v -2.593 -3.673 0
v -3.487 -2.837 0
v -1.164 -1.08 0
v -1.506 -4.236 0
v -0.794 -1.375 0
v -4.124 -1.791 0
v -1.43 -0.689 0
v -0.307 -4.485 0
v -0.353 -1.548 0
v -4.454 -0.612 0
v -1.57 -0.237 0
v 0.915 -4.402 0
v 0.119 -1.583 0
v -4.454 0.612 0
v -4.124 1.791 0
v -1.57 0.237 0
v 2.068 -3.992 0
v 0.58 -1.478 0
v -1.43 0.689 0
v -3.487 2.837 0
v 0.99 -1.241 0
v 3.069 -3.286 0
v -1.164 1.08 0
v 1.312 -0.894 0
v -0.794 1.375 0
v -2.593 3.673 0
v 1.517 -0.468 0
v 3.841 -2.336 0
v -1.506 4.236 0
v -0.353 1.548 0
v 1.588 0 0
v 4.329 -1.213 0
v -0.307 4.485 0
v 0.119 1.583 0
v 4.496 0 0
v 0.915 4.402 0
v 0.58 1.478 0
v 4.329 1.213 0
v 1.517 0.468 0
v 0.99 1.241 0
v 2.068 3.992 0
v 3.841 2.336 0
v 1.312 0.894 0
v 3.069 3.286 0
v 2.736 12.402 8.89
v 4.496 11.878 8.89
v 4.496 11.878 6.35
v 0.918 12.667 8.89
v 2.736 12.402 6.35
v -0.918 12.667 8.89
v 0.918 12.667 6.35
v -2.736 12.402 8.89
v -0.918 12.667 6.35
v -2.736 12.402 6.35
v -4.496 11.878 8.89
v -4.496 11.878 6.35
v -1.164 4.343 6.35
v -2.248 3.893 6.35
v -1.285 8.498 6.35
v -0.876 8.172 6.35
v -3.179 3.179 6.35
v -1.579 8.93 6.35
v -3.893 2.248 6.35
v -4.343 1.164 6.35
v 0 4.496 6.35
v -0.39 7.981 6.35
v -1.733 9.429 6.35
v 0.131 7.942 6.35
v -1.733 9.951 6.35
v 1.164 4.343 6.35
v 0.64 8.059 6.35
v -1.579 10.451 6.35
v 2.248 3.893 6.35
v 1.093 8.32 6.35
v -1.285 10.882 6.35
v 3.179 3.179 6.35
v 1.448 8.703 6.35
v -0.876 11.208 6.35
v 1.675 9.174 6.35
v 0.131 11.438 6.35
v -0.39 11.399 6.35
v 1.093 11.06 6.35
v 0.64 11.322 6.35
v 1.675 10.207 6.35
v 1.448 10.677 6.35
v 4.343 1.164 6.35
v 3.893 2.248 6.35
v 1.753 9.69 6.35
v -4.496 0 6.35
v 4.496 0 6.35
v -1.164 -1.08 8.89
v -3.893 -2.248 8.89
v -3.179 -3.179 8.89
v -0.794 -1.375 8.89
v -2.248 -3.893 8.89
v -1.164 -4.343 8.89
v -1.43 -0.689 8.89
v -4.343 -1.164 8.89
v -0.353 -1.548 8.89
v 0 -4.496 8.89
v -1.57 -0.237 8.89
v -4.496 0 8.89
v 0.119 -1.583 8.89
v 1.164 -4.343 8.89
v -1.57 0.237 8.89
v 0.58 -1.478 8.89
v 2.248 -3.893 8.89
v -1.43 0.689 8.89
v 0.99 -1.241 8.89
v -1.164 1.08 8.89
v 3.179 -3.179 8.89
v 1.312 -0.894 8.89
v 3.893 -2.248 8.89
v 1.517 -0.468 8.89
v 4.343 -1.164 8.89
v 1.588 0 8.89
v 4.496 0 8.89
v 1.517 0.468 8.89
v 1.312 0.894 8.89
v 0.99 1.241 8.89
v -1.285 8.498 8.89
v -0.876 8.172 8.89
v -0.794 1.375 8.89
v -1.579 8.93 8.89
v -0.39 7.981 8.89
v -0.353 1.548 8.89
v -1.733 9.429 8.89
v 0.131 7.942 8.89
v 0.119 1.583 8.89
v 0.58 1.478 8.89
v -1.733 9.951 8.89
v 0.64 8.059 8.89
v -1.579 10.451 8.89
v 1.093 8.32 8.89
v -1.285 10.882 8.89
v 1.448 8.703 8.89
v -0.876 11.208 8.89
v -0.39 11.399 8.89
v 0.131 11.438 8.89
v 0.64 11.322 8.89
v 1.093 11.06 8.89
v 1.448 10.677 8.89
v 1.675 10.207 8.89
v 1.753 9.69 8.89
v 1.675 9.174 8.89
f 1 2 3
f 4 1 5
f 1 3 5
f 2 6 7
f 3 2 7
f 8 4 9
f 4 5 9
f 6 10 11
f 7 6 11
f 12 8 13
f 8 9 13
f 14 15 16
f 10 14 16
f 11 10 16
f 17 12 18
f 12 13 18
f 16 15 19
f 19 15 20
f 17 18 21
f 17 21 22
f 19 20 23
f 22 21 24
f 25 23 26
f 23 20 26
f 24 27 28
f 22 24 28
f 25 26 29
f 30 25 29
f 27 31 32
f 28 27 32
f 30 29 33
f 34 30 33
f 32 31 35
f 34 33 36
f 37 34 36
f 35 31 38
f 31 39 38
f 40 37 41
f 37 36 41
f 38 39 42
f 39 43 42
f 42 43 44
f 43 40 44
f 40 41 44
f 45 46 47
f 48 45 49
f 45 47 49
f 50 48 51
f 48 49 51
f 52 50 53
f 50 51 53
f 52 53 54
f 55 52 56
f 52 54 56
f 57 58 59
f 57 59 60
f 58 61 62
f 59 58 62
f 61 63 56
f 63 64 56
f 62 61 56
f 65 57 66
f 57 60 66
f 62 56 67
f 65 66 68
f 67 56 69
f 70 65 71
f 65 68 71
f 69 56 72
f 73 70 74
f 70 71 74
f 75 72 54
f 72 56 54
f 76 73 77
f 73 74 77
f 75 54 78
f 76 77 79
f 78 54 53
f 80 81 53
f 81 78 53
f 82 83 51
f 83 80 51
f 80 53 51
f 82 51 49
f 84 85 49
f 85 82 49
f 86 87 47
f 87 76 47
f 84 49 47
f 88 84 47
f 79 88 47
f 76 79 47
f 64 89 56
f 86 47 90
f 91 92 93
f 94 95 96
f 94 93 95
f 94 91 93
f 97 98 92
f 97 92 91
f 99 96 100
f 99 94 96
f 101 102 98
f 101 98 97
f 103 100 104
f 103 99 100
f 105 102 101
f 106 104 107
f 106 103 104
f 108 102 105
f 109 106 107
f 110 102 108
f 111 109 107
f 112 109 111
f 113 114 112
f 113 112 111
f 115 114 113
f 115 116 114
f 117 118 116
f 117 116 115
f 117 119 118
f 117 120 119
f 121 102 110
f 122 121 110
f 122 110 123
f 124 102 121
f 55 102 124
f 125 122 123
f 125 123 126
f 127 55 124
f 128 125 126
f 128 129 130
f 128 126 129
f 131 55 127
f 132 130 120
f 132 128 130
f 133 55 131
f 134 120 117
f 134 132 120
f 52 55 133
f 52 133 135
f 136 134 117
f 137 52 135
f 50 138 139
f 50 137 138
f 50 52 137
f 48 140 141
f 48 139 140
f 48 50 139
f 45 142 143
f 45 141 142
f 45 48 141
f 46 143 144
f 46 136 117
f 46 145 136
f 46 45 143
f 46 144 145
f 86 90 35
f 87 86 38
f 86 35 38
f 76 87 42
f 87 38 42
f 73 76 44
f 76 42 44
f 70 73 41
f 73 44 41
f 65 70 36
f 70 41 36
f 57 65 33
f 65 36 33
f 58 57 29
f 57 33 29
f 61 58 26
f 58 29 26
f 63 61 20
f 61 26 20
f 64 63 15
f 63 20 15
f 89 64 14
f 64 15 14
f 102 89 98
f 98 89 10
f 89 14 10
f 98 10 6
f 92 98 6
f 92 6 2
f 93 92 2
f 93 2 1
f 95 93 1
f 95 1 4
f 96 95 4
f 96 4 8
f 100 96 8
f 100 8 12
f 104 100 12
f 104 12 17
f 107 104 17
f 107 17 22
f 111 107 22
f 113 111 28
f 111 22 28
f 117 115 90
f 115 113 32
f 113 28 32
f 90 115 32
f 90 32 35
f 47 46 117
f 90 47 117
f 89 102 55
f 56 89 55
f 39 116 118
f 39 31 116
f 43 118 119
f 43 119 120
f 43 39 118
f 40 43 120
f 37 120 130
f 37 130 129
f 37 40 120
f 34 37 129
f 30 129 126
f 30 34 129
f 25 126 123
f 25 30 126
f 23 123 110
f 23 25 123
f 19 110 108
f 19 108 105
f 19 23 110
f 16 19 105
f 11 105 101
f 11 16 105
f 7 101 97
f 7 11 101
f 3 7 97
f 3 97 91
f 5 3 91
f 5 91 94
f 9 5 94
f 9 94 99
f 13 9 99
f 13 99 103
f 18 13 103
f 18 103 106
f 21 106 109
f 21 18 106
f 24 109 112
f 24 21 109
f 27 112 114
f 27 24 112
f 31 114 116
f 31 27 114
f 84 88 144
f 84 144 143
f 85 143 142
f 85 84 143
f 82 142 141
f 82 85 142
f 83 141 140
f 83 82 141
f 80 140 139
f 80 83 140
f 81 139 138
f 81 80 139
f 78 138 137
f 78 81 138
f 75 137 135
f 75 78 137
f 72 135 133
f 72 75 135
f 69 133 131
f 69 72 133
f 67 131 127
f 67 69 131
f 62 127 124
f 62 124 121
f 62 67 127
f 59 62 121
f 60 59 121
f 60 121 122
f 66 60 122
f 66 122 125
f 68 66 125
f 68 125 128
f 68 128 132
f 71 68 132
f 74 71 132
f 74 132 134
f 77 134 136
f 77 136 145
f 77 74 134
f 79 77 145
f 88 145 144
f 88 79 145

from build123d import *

# Parameters (mm, degrees)
F0_R     = 4.4958
F0_R_2   = 1.5875
F1_DEPTH = 6.35
F2_R     = 12.7
F2_R_2   = 1.7526
F2_R_3   = 1.5875
F3_DEPTH = 2.54
F4_W     = 58.600948
F4_H     = 48.189808
F5_DEPTH = 25.4


with BuildPart() as f1:
    # F0 (on Top) → F1 (new body)
    with BuildSketch(Plane.XY):
        Circle(F0_R)
        Circle(F0_R_2, mode=Mode.SUBTRACT)
    extrude(amount=F1_DEPTH)

    # F2 (on face) → F3 (join)
    with BuildSketch(Plane.XY.offset(6.35)):
        Circle(F2_R)
        with Locations((0, -9.6901)):
            Circle(F2_R_2, mode=Mode.SUBTRACT)
        with Locations((-8.391873, -4.84505)):
            Circle(F2_R_2, mode=Mode.SUBTRACT)
        Circle(F2_R_3, mode=Mode.SUBTRACT)
        with Locations((8.391873, -4.84505)):
            Circle(F2_R_2, mode=Mode.SUBTRACT)
        with Locations((-8.391873, 4.84505)):
            Circle(F2_R_2, mode=Mode.SUBTRACT)
        with Locations((0, 9.6901)):
            Circle(F2_R_2, mode=Mode.SUBTRACT)
        with Locations((8.391873, 4.84505)):
            Circle(F2_R_2, mode=Mode.SUBTRACT)
    extrude(amount=F3_DEPTH)

    # F4 (on face) → F5 (cut)
    with BuildSketch(Plane.XY.offset(8.89)):
        Rectangle(F4_W, F4_H)
        with BuildLine():
            ThreePointArc((4.4958, 0), (0, -4.4958), (-4.4958, 0))
            Line((-4.4958, 0), (-4.4958, 11.877617))
            ThreePointArc((-4.4958, 11.877617), (0, 12.7), (4.4958, 11.877617))
            Line((4.4958, 11.877617), (4.4958, 0))
        make_face(mode=Mode.SUBTRACT)
    extrude(amount=-F5_DEPTH, mode=Mode.SUBTRACT)


solid = f1.part
